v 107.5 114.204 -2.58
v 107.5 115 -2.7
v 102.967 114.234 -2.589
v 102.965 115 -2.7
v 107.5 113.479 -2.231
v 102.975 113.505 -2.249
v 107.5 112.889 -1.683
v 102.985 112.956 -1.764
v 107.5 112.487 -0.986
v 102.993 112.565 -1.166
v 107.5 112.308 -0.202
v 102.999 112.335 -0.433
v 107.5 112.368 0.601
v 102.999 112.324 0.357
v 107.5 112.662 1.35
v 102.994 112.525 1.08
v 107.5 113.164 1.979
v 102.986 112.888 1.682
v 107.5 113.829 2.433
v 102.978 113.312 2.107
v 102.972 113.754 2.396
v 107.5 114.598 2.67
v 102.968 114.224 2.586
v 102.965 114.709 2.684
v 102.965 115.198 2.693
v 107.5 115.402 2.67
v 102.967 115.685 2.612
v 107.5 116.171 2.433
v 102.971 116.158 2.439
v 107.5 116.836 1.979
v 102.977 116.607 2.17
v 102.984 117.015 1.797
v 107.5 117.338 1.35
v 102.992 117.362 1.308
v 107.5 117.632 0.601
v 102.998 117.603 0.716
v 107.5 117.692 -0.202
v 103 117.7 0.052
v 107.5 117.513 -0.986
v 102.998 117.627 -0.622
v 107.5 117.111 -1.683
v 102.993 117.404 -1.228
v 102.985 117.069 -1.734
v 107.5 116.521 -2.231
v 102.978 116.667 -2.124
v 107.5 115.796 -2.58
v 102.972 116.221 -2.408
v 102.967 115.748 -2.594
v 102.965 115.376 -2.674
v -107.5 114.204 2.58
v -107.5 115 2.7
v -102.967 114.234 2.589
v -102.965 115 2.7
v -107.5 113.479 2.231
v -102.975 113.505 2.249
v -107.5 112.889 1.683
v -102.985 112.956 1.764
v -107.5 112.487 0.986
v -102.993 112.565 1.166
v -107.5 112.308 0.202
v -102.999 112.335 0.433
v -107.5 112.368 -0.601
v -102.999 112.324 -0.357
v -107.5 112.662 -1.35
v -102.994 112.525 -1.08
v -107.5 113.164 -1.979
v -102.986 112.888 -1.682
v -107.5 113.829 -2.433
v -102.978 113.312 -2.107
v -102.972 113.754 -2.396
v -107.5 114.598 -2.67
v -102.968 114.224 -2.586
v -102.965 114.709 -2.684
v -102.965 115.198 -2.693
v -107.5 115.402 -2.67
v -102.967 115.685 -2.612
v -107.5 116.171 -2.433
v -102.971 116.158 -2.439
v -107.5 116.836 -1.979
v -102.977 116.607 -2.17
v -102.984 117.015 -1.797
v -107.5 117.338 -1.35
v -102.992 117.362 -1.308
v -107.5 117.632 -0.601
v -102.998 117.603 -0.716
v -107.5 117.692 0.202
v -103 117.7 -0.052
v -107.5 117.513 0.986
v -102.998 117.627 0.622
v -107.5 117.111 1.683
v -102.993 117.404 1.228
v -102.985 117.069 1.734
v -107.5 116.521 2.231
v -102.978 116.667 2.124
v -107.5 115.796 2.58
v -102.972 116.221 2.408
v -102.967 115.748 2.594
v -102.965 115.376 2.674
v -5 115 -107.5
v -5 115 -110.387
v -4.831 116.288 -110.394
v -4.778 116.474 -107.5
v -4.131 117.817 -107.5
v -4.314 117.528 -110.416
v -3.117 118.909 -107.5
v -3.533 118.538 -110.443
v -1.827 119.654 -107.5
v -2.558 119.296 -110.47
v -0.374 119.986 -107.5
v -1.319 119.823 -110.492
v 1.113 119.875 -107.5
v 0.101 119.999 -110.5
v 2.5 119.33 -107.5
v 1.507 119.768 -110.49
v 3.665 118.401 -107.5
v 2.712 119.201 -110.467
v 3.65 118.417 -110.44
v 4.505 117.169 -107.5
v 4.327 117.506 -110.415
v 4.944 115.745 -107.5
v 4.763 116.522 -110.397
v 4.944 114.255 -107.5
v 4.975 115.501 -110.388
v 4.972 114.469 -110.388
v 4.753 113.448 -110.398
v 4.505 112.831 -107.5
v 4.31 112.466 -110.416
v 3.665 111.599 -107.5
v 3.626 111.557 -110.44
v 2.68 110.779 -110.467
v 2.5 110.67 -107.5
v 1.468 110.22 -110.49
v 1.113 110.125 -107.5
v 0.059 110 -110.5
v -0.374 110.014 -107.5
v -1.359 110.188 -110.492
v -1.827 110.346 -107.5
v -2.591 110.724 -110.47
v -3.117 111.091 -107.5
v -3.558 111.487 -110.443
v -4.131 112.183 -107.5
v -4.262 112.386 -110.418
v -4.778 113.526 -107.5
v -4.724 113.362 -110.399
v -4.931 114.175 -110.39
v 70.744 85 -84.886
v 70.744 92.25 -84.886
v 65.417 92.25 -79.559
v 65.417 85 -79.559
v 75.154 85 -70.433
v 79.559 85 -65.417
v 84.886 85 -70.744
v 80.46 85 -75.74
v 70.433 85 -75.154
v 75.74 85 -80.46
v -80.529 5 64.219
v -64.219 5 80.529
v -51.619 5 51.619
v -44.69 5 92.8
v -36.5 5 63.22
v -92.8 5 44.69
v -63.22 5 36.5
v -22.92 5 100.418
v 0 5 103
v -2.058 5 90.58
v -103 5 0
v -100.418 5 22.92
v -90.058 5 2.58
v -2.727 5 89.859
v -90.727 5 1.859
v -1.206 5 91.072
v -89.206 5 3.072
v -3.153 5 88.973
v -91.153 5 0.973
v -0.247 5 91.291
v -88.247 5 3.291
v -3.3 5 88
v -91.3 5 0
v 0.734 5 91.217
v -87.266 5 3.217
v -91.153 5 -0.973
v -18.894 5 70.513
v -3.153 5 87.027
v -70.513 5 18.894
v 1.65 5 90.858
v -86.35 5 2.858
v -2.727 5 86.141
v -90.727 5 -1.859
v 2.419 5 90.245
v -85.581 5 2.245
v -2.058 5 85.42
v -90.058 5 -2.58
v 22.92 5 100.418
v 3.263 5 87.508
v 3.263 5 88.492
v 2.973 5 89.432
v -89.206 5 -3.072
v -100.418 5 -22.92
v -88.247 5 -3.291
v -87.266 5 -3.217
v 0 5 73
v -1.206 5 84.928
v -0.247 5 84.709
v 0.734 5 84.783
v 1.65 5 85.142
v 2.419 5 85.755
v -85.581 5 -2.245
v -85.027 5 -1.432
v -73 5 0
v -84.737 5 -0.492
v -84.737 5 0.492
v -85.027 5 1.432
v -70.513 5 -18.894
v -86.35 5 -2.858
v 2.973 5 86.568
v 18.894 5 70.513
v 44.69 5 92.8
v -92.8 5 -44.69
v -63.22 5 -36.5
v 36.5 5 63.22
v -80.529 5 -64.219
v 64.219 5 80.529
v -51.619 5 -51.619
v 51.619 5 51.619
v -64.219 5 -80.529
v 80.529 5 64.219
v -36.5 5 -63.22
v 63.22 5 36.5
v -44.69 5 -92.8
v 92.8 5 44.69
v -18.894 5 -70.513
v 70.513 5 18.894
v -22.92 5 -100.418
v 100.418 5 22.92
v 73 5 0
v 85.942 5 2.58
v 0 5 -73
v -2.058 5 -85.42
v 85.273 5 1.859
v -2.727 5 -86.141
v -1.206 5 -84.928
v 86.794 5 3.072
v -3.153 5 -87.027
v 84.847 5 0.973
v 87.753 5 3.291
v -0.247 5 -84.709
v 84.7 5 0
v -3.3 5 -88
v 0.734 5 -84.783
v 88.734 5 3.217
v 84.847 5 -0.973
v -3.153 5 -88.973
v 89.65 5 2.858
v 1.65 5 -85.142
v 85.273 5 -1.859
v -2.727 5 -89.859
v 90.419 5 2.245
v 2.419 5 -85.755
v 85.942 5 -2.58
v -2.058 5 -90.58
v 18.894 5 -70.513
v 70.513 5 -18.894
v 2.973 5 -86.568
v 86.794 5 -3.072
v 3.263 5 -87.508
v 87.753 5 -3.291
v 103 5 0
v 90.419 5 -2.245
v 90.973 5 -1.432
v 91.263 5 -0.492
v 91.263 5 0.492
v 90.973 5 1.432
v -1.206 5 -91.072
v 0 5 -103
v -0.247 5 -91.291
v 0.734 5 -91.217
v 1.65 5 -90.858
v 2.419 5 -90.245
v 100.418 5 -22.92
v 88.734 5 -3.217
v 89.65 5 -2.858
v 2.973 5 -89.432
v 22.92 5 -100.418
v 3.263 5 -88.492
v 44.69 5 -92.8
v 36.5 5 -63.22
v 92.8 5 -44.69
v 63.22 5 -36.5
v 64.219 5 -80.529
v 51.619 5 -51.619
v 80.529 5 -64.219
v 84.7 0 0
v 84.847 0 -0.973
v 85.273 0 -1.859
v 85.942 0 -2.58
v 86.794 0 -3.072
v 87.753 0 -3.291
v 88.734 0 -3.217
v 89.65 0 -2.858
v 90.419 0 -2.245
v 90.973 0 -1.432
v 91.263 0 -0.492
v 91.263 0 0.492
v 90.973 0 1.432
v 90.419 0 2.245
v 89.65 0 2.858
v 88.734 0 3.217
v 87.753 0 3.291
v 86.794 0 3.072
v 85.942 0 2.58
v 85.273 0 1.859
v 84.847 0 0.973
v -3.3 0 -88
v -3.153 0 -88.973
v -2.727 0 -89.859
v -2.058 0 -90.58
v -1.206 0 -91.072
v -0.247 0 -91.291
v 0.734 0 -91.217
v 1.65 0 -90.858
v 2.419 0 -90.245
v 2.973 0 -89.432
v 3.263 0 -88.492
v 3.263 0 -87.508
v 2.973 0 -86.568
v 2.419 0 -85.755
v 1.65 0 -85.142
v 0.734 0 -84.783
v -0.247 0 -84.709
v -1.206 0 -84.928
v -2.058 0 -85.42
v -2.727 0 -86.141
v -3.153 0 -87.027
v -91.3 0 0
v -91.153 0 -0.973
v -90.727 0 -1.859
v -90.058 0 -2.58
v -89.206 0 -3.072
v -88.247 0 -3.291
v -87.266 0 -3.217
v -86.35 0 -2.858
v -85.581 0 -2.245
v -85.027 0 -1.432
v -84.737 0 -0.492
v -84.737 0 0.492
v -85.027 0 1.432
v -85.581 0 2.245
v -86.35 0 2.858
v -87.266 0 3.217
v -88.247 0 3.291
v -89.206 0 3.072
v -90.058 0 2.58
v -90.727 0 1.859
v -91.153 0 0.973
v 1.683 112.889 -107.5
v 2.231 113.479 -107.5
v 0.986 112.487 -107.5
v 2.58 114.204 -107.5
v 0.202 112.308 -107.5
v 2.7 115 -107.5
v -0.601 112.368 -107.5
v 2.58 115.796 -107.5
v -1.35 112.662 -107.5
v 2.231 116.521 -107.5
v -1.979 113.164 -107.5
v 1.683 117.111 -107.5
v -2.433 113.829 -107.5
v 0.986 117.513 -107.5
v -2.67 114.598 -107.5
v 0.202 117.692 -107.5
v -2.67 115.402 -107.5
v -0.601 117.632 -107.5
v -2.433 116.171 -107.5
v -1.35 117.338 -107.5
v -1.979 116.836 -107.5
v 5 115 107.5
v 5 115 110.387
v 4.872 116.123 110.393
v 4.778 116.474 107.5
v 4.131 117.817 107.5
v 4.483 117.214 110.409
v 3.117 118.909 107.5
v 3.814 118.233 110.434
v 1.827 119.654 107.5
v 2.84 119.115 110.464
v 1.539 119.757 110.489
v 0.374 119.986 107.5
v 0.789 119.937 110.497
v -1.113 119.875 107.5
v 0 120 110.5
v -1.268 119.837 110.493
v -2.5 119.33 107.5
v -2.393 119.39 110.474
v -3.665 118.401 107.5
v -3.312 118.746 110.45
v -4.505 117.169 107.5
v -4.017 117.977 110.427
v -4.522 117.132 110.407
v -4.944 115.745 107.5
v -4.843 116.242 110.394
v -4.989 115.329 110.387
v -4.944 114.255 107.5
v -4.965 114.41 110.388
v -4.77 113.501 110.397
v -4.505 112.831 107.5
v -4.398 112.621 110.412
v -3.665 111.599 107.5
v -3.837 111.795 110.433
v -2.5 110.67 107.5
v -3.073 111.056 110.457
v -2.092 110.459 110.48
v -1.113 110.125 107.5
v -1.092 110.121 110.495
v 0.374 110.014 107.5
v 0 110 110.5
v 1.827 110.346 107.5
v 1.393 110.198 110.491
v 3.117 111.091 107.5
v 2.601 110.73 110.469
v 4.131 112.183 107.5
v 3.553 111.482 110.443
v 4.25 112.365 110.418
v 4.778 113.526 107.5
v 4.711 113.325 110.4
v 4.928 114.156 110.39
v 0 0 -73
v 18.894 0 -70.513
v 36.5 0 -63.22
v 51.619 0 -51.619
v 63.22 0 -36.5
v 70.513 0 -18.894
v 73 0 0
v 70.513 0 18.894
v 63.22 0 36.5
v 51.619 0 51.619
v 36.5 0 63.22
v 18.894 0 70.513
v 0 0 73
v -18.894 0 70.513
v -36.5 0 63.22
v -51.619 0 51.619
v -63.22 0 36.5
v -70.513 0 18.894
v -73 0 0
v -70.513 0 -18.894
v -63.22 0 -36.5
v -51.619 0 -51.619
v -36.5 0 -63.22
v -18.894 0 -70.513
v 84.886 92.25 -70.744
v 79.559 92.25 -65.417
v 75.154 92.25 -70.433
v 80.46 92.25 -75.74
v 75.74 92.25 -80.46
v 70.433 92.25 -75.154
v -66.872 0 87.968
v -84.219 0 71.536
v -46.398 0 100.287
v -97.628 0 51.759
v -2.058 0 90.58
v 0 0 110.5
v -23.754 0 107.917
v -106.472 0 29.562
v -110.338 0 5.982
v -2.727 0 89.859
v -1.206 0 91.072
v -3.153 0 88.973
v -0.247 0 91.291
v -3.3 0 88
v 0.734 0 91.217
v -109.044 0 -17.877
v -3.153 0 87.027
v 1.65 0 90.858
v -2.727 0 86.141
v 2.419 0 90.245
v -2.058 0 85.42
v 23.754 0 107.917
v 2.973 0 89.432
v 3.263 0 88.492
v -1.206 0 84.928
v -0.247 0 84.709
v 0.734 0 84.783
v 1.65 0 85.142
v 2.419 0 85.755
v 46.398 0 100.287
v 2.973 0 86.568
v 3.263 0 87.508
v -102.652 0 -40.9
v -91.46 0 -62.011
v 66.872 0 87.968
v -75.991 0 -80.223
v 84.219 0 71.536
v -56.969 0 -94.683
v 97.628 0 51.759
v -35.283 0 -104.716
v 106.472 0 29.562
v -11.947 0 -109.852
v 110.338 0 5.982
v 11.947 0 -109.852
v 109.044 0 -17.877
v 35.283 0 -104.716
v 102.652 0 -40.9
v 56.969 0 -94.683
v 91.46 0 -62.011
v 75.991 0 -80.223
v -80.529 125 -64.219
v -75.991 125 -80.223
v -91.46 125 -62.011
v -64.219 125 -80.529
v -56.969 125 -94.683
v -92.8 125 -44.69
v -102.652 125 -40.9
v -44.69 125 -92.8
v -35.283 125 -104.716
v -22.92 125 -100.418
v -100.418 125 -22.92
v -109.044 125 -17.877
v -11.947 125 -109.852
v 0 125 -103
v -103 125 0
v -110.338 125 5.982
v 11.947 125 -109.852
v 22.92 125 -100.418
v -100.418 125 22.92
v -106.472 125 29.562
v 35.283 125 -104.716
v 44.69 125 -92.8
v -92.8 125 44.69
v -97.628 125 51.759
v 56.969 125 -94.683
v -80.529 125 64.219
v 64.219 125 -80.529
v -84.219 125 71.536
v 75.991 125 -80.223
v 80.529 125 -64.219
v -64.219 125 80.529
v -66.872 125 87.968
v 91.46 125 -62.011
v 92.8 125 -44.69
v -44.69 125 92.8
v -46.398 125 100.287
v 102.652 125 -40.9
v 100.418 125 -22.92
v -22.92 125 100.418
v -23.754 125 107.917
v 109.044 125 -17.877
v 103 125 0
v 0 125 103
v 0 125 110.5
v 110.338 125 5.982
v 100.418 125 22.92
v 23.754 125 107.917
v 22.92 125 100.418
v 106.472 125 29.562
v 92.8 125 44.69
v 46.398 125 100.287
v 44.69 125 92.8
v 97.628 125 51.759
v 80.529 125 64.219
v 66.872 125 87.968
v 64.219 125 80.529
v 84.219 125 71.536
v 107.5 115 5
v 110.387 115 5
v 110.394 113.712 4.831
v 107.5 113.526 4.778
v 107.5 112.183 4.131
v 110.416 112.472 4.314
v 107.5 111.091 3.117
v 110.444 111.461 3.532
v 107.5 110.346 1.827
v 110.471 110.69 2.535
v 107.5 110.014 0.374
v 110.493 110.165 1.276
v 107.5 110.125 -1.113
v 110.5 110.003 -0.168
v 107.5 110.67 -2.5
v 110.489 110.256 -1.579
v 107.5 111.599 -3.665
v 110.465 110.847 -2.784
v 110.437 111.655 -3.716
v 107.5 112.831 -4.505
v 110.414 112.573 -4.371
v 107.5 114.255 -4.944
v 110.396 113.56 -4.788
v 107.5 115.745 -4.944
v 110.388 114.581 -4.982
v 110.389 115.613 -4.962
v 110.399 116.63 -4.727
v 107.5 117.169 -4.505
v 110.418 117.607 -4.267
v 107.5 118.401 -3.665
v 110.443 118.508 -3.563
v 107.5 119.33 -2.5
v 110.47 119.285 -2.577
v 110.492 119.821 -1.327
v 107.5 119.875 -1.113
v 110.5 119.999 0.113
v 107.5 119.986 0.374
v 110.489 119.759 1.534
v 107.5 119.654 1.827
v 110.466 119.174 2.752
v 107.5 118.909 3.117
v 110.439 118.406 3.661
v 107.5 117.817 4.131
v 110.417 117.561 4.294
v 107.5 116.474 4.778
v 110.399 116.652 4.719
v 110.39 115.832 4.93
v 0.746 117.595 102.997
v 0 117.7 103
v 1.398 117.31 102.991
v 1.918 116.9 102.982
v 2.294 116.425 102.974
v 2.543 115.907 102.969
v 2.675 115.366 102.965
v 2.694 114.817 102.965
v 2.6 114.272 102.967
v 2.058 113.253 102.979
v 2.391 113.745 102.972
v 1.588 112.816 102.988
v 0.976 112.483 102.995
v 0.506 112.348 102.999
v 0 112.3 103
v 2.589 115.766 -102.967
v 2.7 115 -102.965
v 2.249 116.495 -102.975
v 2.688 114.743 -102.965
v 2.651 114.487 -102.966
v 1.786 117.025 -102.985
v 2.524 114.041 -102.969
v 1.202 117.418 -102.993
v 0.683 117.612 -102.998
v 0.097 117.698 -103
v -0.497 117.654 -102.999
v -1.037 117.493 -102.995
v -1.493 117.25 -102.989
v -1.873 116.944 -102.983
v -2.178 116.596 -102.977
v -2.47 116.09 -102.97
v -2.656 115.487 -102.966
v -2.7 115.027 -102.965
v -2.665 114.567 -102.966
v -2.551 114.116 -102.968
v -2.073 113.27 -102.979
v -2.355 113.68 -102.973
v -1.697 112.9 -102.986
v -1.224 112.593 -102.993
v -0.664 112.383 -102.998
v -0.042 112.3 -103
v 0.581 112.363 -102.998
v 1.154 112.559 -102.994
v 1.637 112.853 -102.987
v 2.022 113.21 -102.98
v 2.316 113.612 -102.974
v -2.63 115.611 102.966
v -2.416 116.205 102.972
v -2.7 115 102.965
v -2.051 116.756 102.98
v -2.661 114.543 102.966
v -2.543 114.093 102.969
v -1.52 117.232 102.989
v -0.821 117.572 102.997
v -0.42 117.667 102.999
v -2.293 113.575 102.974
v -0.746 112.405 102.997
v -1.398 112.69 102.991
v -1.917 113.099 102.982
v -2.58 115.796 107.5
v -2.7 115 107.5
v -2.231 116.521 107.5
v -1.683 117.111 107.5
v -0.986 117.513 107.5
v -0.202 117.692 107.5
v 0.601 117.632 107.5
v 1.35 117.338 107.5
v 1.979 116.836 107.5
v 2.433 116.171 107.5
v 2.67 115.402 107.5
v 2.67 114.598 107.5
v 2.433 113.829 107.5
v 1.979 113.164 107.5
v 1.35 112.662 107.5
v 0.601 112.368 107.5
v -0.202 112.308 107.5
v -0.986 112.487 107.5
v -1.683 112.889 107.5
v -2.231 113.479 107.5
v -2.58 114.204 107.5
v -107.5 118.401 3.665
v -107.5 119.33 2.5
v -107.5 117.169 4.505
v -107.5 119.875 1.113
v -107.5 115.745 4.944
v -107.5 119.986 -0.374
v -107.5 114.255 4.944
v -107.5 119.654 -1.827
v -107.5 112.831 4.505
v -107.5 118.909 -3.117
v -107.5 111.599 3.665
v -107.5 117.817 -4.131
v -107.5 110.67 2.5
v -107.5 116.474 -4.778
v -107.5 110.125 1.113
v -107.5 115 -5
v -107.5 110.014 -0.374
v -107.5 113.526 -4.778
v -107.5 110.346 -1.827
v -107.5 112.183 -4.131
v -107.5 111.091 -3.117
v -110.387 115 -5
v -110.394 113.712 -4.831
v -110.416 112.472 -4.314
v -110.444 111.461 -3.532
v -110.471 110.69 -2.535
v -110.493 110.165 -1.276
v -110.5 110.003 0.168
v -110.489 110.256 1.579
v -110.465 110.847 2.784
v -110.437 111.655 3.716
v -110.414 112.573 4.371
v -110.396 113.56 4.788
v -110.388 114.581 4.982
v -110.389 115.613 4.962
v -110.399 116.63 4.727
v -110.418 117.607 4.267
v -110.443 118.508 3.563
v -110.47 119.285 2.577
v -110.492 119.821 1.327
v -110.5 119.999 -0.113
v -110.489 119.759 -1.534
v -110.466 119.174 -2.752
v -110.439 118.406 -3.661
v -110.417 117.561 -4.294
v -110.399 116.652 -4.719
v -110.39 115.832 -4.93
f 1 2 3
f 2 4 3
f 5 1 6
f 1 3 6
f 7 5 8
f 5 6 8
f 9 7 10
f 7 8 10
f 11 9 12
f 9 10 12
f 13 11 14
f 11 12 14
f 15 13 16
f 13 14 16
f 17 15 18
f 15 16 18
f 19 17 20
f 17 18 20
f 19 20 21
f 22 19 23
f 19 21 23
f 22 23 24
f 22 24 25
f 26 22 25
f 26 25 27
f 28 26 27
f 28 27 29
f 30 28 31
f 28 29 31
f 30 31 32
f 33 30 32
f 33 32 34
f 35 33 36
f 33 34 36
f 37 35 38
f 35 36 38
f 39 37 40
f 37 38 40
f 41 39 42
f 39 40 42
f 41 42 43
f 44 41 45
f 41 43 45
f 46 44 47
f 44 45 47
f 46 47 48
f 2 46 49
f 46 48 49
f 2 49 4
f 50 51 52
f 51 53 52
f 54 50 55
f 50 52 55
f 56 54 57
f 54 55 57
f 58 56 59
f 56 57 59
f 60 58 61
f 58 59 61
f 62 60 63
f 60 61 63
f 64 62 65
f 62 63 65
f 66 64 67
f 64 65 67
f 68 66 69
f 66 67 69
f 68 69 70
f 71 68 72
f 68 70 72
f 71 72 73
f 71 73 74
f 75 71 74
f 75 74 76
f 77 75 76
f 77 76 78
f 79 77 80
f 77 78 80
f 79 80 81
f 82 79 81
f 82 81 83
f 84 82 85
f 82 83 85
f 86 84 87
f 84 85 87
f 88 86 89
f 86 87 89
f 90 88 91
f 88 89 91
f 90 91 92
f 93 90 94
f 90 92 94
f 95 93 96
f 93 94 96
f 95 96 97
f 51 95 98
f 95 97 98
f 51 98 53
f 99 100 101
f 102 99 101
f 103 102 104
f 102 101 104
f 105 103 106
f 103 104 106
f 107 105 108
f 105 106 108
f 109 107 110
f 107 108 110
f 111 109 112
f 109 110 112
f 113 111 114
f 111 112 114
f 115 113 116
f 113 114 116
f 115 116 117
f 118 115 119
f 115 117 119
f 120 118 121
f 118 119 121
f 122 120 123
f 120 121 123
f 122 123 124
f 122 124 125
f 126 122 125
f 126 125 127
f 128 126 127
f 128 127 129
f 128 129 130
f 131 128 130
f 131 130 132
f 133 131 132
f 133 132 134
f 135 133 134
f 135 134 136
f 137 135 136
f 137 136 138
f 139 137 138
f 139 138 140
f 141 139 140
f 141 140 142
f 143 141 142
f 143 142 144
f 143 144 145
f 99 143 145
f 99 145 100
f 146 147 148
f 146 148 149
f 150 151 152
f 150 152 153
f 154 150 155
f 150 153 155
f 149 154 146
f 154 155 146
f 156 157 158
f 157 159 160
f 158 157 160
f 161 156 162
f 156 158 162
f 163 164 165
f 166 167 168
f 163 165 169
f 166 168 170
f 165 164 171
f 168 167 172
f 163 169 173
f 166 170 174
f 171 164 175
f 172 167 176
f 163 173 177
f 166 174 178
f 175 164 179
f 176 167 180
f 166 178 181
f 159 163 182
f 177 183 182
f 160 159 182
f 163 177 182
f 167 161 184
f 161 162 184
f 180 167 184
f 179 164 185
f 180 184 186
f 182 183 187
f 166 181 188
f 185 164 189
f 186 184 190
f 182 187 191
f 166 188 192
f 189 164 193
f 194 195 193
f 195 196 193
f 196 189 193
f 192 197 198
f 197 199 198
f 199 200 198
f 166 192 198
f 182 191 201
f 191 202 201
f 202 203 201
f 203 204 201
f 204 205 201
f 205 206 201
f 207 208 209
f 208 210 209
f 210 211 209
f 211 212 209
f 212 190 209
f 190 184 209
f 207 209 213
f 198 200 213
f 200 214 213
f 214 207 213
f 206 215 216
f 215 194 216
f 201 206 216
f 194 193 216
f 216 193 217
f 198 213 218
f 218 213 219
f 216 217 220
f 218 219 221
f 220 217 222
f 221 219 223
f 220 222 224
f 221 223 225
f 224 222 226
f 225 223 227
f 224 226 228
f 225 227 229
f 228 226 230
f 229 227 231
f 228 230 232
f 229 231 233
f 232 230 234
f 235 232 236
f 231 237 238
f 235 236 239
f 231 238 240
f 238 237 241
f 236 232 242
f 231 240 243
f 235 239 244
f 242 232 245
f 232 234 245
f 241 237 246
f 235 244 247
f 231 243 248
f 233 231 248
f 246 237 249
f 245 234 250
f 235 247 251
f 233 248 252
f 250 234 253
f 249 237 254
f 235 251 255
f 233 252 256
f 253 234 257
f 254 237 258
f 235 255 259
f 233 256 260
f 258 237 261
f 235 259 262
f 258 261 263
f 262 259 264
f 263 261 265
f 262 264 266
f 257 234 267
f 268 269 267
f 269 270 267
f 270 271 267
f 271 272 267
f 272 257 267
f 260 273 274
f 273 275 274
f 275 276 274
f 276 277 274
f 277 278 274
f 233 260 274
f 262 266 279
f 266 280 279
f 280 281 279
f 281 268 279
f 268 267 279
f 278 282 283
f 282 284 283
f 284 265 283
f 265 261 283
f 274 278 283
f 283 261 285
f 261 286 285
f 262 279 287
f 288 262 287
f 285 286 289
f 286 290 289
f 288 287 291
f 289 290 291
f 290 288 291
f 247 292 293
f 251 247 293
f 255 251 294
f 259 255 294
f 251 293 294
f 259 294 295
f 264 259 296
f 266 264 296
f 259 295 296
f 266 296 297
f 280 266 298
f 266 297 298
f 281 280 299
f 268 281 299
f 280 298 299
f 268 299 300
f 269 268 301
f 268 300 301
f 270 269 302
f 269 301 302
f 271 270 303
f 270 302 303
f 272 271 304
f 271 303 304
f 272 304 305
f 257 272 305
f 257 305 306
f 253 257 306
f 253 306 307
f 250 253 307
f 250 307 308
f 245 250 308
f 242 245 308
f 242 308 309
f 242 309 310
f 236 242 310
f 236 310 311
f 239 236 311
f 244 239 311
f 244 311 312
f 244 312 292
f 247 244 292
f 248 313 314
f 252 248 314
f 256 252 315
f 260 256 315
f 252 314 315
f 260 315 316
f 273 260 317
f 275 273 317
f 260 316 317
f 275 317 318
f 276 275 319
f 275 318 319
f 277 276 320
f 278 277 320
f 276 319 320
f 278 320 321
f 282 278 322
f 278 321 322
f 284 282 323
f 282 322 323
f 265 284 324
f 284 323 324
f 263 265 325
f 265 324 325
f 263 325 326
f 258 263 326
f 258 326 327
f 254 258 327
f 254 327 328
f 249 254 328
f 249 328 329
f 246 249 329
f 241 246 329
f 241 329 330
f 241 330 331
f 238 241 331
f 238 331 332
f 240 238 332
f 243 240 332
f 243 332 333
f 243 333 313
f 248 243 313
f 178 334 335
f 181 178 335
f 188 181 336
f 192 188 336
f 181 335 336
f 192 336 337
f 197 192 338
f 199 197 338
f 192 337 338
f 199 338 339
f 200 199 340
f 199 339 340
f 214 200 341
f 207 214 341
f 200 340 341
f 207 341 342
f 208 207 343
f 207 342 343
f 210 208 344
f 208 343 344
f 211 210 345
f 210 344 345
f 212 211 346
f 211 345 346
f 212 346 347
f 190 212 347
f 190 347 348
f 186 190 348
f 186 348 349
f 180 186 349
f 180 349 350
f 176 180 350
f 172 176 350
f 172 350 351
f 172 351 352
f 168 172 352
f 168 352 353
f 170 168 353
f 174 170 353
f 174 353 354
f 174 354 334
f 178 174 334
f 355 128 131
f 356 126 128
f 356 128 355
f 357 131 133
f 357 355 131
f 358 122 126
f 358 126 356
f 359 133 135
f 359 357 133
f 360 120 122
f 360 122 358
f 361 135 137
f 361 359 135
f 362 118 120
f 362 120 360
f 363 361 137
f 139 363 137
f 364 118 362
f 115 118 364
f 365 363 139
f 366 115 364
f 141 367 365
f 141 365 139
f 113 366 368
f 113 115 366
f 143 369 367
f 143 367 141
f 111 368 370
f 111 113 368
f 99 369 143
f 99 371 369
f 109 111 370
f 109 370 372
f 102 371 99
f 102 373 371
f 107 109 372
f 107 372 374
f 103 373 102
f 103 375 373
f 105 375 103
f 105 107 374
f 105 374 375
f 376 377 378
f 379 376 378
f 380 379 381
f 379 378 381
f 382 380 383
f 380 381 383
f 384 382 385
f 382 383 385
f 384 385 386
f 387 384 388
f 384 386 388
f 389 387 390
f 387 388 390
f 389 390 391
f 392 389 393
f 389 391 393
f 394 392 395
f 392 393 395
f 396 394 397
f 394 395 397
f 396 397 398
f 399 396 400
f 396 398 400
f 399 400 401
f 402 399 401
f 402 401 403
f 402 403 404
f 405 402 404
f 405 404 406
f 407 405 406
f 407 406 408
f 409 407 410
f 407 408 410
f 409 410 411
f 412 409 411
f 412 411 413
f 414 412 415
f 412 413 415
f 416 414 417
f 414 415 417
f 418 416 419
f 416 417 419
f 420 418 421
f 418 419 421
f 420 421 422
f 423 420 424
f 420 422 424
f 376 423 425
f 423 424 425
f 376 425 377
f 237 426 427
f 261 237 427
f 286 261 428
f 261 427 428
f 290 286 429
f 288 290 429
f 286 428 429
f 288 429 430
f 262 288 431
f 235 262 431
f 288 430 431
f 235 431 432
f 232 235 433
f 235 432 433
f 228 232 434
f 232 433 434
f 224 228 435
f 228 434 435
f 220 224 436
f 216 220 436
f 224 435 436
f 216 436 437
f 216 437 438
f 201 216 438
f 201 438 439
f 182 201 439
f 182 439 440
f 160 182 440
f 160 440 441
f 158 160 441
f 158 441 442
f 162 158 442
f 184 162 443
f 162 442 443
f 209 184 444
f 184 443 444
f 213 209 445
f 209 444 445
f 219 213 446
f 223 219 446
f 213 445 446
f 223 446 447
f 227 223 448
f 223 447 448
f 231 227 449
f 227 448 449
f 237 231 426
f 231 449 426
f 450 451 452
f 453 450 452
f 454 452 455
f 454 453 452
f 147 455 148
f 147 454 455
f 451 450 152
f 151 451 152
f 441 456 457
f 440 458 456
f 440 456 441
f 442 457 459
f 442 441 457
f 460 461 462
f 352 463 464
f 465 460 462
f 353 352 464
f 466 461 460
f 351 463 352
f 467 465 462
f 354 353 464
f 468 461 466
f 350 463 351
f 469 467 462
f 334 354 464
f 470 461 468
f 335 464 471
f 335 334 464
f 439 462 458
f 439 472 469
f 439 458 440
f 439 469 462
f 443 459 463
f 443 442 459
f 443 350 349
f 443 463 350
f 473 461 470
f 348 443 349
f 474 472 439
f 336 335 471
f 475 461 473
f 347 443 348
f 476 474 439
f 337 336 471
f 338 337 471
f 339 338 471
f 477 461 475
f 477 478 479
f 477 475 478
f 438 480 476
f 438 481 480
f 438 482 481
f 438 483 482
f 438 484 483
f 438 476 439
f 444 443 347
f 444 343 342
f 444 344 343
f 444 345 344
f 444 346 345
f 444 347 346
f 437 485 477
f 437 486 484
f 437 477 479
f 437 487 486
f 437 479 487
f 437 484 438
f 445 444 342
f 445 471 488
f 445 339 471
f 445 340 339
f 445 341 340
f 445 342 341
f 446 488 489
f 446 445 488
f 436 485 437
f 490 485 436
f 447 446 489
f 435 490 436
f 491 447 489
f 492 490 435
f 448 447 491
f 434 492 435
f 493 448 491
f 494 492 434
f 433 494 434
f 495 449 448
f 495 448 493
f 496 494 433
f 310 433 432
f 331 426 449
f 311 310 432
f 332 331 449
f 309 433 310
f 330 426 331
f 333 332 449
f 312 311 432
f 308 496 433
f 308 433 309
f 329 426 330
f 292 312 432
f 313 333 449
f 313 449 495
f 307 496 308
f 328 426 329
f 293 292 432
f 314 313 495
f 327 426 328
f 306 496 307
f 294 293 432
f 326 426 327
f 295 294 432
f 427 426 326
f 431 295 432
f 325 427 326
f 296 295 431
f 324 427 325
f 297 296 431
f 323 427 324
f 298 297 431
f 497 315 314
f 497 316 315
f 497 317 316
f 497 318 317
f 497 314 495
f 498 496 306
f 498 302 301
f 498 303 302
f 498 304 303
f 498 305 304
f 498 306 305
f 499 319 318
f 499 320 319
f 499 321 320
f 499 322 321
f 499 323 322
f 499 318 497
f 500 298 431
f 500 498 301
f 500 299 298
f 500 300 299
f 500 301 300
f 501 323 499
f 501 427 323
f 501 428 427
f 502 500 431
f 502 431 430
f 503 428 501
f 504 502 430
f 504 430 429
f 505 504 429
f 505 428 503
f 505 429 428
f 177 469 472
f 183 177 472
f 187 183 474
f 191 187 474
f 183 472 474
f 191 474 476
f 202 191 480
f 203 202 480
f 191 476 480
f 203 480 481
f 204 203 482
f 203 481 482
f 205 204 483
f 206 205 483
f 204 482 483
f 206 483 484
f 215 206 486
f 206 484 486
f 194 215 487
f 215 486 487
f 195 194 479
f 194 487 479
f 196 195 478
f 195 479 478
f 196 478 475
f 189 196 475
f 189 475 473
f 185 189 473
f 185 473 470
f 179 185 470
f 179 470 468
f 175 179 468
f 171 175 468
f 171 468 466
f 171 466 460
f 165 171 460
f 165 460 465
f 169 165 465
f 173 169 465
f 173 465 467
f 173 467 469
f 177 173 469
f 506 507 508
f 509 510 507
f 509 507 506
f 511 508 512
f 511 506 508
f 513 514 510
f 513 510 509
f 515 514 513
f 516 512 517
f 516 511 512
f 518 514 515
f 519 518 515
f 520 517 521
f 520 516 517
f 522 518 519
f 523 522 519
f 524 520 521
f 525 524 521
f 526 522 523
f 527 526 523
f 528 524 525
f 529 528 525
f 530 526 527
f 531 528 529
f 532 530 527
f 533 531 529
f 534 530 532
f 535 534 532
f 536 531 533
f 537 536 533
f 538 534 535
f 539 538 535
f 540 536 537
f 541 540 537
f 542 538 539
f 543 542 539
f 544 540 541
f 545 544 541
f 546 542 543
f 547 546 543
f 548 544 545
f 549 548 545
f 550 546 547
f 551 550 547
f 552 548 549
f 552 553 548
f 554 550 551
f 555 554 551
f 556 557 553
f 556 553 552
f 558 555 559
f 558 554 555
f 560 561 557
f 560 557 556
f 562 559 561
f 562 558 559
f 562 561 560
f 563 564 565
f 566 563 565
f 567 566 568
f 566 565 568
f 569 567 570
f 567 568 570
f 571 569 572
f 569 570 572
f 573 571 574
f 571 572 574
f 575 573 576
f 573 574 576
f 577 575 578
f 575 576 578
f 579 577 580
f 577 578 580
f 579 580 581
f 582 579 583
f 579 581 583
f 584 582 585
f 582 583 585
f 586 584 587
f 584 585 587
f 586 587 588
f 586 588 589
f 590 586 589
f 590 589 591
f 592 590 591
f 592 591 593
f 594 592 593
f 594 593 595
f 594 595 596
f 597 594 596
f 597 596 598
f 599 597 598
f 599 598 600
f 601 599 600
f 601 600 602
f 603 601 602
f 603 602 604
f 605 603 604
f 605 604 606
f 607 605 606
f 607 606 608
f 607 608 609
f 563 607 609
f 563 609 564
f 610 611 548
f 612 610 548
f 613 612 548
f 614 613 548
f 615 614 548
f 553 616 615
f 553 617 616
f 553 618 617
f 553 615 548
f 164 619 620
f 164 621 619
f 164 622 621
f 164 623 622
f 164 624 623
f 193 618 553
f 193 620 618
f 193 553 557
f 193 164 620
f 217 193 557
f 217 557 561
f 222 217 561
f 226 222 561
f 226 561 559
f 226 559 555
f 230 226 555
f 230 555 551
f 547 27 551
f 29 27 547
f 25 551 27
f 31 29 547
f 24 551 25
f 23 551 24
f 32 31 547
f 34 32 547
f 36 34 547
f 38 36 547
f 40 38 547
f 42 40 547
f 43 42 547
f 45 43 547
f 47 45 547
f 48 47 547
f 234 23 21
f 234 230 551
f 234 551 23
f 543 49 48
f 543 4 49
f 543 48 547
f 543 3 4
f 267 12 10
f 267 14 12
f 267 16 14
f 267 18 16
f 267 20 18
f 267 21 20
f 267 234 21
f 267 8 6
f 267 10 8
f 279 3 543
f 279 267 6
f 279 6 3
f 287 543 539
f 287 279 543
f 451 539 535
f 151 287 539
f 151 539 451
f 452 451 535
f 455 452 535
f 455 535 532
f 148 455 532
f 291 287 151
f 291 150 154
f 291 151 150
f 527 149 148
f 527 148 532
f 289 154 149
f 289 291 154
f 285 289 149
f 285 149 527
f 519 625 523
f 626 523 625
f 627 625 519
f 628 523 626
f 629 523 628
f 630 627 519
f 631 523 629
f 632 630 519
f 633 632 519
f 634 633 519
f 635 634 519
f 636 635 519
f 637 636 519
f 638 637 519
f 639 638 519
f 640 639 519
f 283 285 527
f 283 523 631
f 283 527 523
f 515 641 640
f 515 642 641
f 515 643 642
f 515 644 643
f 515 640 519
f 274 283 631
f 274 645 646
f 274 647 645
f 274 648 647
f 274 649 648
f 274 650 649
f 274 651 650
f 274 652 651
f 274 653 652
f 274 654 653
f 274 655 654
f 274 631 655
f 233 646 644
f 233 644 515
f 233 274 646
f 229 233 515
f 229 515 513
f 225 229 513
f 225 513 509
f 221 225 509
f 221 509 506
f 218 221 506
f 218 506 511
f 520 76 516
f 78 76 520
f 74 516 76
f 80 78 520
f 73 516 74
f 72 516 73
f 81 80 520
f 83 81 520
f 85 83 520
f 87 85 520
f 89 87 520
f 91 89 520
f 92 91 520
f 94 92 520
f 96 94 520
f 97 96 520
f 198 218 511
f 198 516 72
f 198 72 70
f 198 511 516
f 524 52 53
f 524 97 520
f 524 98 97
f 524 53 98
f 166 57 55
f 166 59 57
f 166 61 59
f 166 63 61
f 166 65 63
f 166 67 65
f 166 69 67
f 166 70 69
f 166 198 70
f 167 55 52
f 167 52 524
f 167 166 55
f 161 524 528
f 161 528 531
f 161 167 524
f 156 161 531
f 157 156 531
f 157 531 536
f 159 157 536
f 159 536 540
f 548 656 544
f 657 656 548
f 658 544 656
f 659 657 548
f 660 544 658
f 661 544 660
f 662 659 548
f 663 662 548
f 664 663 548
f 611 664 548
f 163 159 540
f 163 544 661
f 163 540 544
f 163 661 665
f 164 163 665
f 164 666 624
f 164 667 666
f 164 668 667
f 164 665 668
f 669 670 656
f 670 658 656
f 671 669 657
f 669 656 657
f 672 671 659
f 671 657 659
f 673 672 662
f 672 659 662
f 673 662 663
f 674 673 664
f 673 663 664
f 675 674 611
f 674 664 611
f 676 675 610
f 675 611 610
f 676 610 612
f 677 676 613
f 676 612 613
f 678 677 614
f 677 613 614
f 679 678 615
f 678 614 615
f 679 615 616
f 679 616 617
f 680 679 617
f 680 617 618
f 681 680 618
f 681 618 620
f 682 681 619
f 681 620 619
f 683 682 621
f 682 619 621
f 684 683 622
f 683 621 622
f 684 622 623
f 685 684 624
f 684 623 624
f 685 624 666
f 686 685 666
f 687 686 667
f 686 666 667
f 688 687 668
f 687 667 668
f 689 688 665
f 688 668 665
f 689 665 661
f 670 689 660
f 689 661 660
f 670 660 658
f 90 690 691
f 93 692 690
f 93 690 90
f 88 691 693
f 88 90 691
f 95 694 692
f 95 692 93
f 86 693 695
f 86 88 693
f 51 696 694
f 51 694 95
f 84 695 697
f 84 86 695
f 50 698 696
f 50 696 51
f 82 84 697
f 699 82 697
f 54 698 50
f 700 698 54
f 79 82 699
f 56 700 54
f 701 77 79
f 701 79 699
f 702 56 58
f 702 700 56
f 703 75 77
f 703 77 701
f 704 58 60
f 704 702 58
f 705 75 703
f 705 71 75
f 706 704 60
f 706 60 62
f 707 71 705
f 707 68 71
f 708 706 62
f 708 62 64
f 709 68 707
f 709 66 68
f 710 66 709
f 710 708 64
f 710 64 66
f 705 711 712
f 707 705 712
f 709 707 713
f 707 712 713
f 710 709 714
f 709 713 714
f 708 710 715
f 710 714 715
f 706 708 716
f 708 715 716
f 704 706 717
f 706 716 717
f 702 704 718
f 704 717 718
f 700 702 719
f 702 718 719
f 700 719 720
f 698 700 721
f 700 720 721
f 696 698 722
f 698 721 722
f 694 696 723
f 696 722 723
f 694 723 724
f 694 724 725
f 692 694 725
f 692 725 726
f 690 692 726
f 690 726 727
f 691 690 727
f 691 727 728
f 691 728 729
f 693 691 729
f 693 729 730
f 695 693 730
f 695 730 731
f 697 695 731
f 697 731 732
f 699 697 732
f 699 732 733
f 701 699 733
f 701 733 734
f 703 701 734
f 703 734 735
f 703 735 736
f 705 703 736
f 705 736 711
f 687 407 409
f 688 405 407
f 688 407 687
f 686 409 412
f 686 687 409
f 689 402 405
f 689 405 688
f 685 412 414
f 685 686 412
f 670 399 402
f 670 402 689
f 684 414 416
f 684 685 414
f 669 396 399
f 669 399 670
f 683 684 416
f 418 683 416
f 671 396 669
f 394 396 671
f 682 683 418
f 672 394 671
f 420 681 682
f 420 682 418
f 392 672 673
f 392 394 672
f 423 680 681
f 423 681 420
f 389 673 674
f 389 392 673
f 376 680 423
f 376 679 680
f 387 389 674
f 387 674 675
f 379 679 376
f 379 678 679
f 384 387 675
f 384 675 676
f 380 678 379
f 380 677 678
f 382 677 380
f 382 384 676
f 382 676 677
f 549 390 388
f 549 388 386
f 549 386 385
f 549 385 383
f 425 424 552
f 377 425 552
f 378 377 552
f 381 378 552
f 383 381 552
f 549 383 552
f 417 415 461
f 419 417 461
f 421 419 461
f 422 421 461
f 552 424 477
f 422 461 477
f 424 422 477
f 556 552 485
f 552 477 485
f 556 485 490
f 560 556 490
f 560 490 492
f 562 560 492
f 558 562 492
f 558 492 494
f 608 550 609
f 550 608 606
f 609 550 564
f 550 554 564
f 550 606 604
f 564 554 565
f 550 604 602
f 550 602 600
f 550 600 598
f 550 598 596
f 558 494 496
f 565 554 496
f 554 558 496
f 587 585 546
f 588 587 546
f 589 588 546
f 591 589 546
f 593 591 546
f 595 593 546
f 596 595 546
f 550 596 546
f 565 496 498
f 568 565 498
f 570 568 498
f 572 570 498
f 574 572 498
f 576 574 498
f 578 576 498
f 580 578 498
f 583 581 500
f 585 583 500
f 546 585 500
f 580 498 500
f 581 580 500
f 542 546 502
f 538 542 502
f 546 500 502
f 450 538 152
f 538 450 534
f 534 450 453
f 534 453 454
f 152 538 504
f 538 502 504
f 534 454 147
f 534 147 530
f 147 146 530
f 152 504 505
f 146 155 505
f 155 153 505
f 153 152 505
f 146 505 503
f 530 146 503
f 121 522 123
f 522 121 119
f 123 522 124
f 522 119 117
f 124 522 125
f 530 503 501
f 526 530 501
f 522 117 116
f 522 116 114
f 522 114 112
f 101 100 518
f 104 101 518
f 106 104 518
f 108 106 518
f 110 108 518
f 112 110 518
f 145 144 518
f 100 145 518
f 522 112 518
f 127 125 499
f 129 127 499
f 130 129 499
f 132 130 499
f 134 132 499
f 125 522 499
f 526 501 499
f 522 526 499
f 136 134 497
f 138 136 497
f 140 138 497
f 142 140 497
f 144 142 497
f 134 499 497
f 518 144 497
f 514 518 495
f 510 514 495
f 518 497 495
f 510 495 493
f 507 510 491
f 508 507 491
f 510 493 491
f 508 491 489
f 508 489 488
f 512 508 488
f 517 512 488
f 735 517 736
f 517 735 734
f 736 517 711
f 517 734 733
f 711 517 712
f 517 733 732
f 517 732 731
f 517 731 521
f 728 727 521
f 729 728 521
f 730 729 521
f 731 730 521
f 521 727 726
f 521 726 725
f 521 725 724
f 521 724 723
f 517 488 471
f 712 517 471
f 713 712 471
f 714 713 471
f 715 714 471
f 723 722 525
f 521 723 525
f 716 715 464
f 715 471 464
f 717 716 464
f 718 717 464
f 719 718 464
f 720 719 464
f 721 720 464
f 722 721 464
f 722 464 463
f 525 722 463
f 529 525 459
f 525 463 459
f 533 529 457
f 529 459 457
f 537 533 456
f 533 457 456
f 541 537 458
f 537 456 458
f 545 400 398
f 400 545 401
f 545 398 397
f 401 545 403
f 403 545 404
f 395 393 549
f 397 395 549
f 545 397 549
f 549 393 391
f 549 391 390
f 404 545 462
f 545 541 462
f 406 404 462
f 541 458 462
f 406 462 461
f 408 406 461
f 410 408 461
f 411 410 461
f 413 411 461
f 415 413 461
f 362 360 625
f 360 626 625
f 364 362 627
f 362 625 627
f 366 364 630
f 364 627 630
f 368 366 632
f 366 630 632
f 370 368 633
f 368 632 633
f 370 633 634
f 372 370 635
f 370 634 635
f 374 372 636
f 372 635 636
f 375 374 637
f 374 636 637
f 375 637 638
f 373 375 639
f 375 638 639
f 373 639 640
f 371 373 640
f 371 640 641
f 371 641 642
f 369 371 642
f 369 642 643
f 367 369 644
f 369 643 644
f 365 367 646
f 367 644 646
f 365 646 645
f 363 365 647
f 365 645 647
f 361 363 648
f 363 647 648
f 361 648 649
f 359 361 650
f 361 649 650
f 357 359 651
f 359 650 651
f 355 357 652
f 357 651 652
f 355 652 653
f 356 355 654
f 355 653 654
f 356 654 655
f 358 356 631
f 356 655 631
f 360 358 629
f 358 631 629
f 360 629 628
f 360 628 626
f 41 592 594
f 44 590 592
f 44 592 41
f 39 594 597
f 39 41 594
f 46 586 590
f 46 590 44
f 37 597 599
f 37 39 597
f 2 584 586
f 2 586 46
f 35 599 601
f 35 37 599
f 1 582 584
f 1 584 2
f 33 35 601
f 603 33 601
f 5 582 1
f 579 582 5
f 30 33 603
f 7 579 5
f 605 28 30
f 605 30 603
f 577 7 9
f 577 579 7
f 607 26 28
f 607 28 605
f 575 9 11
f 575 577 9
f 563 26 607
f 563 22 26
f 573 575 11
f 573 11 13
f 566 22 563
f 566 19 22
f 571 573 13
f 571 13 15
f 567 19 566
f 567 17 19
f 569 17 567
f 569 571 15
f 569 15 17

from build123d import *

# Parameters (mm, degrees)
SCHIZZO1_R                                           = 110.5
SCHIZZO1_R_2                                         = 103
ESTRUSIONE_ESTRUSIONE1_DEPTH                         = 125
FORO_LAMATO_PER_BULLONE_M12_A_TESTA_ESAG_D           = 5.4
FORO_LAMATO_PER_BULLONE_M12_A_TESTA_ESAG_DEPTH       = 8.1
FORO_LAMATO_PER_BULLONE_M12_A_TESTA_ESAG_CBORE_D     = 10
FORO_LAMATO_PER_BULLONE_M12_A_TESTA_ESAG_CBORE_DEPTH = 3
FORO_LAMATO_PER_BULLONE_M12_A_TESTA_ESAG_TIP         = 1.622323671
FORO_LAMATO_PER_BULLONE_M12_A_TESTA_2_D              = 5.4
FORO_LAMATO_PER_BULLONE_M12_A_TESTA_2_DEPTH          = 8.1
FORO_LAMATO_PER_BULLONE_M12_A_TESTA_2_CBORE_D        = 10
FORO_LAMATO_PER_BULLONE_M12_A_TESTA_2_CBORE_DEPTH    = 3
FORO_LAMATO_PER_BULLONE_M12_A_TESTA_2_TIP            = 1.622323671
FORO_LAMATO_PER_BULLONE_M12_A_TESTA_3_D              = 5.4
FORO_LAMATO_PER_BULLONE_M12_A_TESTA_3_DEPTH          = 8.1
FORO_LAMATO_PER_BULLONE_M12_A_TESTA_3_CBORE_D        = 10
FORO_LAMATO_PER_BULLONE_M12_A_TESTA_3_CBORE_DEPTH    = 3
FORO_LAMATO_PER_BULLONE_M12_A_TESTA_3_TIP            = 1.622323671
FORO_LAMATO_PER_BULLONE_M12_A_TESTA_4_D              = 5.4
FORO_LAMATO_PER_BULLONE_M12_A_TESTA_4_DEPTH          = 8.1
FORO_LAMATO_PER_BULLONE_M12_A_TESTA_4_CBORE_D        = 10
FORO_LAMATO_PER_BULLONE_M12_A_TESTA_4_CBORE_DEPTH    = 3
FORO_LAMATO_PER_BULLONE_M12_A_TESTA_4_TIP            = 1.622323671
SCHIZZO4_R                                           = 103
SCHIZZO4_R_2                                         = 73
ESTRUSIONE_ESTRUSIONE2_DEPTH                         = 5
FORO_PER_VITE_M6_1_D                                 = 6.6
SCHIZZO7_W                                           = 7.25
SCHIZZO7_H                                           = 20
TAGLIO_ESTRUSIONE1_DEPTH                             = 10


with BuildPart() as part:
    # Schizzo1 → Estrusione-Estrusione1 (new body)
    with BuildSketch(Plane(origin=(0, 0, 0), x_dir=(1, 0, 0), z_dir=(0, 1, 0))):
        with Locations(Location((0, 0, 0), (0, 0, 270))):
            Circle(SCHIZZO1_R)
        with Locations(Location((0, 0, 0), (0, 0, 270))):
            Circle(SCHIZZO1_R_2, mode=Mode.SUBTRACT)
    extrude(amount=ESTRUSIONE_ESTRUSIONE1_DEPTH)

    # Foro lamato per Bullone M12 a testa esagonale (Classe superiore)-1
    with Locations(Plane(origin=(0, 115, 110.5), x_dir=(1, 0, 0), z_dir=(0, 0, 1))):
        with Locations((0, 0)):
            CounterBoreHole(FORO_LAMATO_PER_BULLONE_M12_A_TESTA_ESAG_D / 2, FORO_LAMATO_PER_BULLONE_M12_A_TESTA_ESAG_CBORE_D / 2, FORO_LAMATO_PER_BULLONE_M12_A_TESTA_ESAG_CBORE_DEPTH, depth=FORO_LAMATO_PER_BULLONE_M12_A_TESTA_ESAG_DEPTH)
            with Locations((0, 0, -(FORO_LAMATO_PER_BULLONE_M12_A_TESTA_ESAG_DEPTH + FORO_LAMATO_PER_BULLONE_M12_A_TESTA_ESAG_TIP / 2))):  # 118° drill point
                Cone(0, FORO_LAMATO_PER_BULLONE_M12_A_TESTA_ESAG_D / 2, FORO_LAMATO_PER_BULLONE_M12_A_TESTA_ESAG_TIP, mode=Mode.SUBTRACT)

    # Foro lamato per Bullone M12 a testa  2
    with Locations(Plane(origin=(110.5, 115, 0), x_dir=(0, 0, 1), z_dir=(1, 0, 0))):
        with Locations((0, 0)):
            CounterBoreHole(FORO_LAMATO_PER_BULLONE_M12_A_TESTA_2_D / 2, FORO_LAMATO_PER_BULLONE_M12_A_TESTA_2_CBORE_D / 2, FORO_LAMATO_PER_BULLONE_M12_A_TESTA_2_CBORE_DEPTH, depth=FORO_LAMATO_PER_BULLONE_M12_A_TESTA_2_DEPTH)
            with Locations((0, 0, -(FORO_LAMATO_PER_BULLONE_M12_A_TESTA_2_DEPTH + FORO_LAMATO_PER_BULLONE_M12_A_TESTA_2_TIP / 2))):  # 118° drill point
                Cone(0, FORO_LAMATO_PER_BULLONE_M12_A_TESTA_2_D / 2, FORO_LAMATO_PER_BULLONE_M12_A_TESTA_2_TIP, mode=Mode.SUBTRACT)

    # Foro lamato per Bullone M12 a testa  3
    with Locations(Plane(origin=(0, 115, -110.5), x_dir=(-1, 0, 0), z_dir=(0, 0, -1))):
        with Locations((0, 0)):
            CounterBoreHole(FORO_LAMATO_PER_BULLONE_M12_A_TESTA_3_D / 2, FORO_LAMATO_PER_BULLONE_M12_A_TESTA_3_CBORE_D / 2, FORO_LAMATO_PER_BULLONE_M12_A_TESTA_3_CBORE_DEPTH, depth=FORO_LAMATO_PER_BULLONE_M12_A_TESTA_3_DEPTH)
            with Locations((0, 0, -(FORO_LAMATO_PER_BULLONE_M12_A_TESTA_3_DEPTH + FORO_LAMATO_PER_BULLONE_M12_A_TESTA_3_TIP / 2))):  # 118° drill point
                Cone(0, FORO_LAMATO_PER_BULLONE_M12_A_TESTA_3_D / 2, FORO_LAMATO_PER_BULLONE_M12_A_TESTA_3_TIP, mode=Mode.SUBTRACT)

    # Foro lamato per Bullone M12 a testa  4
    with Locations(Plane(origin=(-110.5, 115, 0), x_dir=(0, 0, -1), z_dir=(-1, 0, 0))):
        with Locations((0, 0)):
            CounterBoreHole(FORO_LAMATO_PER_BULLONE_M12_A_TESTA_4_D / 2, FORO_LAMATO_PER_BULLONE_M12_A_TESTA_4_CBORE_D / 2, FORO_LAMATO_PER_BULLONE_M12_A_TESTA_4_CBORE_DEPTH, depth=FORO_LAMATO_PER_BULLONE_M12_A_TESTA_4_DEPTH)
            with Locations((0, 0, -(FORO_LAMATO_PER_BULLONE_M12_A_TESTA_4_DEPTH + FORO_LAMATO_PER_BULLONE_M12_A_TESTA_4_TIP / 2))):  # 118° drill point
                Cone(0, FORO_LAMATO_PER_BULLONE_M12_A_TESTA_4_D / 2, FORO_LAMATO_PER_BULLONE_M12_A_TESTA_4_TIP, mode=Mode.SUBTRACT)

    # Schizzo4 → Estrusione-Estrusione2 (add)
    with BuildSketch(Plane.XZ):
        with Locations(Location((0, 0, 0), (0, 0, 270))):
            Circle(SCHIZZO4_R)
        with Locations(Location((0, 0, 0), (0, 0, 270))):
            Circle(SCHIZZO4_R_2, mode=Mode.SUBTRACT)
    extrude(amount=-ESTRUSIONE_ESTRUSIONE2_DEPTH)

    # Foro per Vite M6-1 (through all)
    with Locations(Plane(origin=(0, 5, 0), x_dir=(1, 0, 0), z_dir=(0, 1, 0))):
        with Locations((0, -88), (-88, 0), (88, 0), (0, 88)):
            Hole(FORO_PER_VITE_M6_1_D / 2)

    # Schizzo7 → Taglio-Estrusione1 (cut)
    with BuildSketch(Plane(origin=(78.135299321, 0, -78.135299321), x_dir=(0, -1, 0), z_dir=(0.7071067811865488, 0, -0.7071067811865464))):
        with Locations((-88.625, 0)):
            Rectangle(SCHIZZO7_W, SCHIZZO7_H)
    extrude(amount=-TAGLIO_ESTRUSIONE1_DEPTH, mode=Mode.SUBTRACT)


solid = part.part
